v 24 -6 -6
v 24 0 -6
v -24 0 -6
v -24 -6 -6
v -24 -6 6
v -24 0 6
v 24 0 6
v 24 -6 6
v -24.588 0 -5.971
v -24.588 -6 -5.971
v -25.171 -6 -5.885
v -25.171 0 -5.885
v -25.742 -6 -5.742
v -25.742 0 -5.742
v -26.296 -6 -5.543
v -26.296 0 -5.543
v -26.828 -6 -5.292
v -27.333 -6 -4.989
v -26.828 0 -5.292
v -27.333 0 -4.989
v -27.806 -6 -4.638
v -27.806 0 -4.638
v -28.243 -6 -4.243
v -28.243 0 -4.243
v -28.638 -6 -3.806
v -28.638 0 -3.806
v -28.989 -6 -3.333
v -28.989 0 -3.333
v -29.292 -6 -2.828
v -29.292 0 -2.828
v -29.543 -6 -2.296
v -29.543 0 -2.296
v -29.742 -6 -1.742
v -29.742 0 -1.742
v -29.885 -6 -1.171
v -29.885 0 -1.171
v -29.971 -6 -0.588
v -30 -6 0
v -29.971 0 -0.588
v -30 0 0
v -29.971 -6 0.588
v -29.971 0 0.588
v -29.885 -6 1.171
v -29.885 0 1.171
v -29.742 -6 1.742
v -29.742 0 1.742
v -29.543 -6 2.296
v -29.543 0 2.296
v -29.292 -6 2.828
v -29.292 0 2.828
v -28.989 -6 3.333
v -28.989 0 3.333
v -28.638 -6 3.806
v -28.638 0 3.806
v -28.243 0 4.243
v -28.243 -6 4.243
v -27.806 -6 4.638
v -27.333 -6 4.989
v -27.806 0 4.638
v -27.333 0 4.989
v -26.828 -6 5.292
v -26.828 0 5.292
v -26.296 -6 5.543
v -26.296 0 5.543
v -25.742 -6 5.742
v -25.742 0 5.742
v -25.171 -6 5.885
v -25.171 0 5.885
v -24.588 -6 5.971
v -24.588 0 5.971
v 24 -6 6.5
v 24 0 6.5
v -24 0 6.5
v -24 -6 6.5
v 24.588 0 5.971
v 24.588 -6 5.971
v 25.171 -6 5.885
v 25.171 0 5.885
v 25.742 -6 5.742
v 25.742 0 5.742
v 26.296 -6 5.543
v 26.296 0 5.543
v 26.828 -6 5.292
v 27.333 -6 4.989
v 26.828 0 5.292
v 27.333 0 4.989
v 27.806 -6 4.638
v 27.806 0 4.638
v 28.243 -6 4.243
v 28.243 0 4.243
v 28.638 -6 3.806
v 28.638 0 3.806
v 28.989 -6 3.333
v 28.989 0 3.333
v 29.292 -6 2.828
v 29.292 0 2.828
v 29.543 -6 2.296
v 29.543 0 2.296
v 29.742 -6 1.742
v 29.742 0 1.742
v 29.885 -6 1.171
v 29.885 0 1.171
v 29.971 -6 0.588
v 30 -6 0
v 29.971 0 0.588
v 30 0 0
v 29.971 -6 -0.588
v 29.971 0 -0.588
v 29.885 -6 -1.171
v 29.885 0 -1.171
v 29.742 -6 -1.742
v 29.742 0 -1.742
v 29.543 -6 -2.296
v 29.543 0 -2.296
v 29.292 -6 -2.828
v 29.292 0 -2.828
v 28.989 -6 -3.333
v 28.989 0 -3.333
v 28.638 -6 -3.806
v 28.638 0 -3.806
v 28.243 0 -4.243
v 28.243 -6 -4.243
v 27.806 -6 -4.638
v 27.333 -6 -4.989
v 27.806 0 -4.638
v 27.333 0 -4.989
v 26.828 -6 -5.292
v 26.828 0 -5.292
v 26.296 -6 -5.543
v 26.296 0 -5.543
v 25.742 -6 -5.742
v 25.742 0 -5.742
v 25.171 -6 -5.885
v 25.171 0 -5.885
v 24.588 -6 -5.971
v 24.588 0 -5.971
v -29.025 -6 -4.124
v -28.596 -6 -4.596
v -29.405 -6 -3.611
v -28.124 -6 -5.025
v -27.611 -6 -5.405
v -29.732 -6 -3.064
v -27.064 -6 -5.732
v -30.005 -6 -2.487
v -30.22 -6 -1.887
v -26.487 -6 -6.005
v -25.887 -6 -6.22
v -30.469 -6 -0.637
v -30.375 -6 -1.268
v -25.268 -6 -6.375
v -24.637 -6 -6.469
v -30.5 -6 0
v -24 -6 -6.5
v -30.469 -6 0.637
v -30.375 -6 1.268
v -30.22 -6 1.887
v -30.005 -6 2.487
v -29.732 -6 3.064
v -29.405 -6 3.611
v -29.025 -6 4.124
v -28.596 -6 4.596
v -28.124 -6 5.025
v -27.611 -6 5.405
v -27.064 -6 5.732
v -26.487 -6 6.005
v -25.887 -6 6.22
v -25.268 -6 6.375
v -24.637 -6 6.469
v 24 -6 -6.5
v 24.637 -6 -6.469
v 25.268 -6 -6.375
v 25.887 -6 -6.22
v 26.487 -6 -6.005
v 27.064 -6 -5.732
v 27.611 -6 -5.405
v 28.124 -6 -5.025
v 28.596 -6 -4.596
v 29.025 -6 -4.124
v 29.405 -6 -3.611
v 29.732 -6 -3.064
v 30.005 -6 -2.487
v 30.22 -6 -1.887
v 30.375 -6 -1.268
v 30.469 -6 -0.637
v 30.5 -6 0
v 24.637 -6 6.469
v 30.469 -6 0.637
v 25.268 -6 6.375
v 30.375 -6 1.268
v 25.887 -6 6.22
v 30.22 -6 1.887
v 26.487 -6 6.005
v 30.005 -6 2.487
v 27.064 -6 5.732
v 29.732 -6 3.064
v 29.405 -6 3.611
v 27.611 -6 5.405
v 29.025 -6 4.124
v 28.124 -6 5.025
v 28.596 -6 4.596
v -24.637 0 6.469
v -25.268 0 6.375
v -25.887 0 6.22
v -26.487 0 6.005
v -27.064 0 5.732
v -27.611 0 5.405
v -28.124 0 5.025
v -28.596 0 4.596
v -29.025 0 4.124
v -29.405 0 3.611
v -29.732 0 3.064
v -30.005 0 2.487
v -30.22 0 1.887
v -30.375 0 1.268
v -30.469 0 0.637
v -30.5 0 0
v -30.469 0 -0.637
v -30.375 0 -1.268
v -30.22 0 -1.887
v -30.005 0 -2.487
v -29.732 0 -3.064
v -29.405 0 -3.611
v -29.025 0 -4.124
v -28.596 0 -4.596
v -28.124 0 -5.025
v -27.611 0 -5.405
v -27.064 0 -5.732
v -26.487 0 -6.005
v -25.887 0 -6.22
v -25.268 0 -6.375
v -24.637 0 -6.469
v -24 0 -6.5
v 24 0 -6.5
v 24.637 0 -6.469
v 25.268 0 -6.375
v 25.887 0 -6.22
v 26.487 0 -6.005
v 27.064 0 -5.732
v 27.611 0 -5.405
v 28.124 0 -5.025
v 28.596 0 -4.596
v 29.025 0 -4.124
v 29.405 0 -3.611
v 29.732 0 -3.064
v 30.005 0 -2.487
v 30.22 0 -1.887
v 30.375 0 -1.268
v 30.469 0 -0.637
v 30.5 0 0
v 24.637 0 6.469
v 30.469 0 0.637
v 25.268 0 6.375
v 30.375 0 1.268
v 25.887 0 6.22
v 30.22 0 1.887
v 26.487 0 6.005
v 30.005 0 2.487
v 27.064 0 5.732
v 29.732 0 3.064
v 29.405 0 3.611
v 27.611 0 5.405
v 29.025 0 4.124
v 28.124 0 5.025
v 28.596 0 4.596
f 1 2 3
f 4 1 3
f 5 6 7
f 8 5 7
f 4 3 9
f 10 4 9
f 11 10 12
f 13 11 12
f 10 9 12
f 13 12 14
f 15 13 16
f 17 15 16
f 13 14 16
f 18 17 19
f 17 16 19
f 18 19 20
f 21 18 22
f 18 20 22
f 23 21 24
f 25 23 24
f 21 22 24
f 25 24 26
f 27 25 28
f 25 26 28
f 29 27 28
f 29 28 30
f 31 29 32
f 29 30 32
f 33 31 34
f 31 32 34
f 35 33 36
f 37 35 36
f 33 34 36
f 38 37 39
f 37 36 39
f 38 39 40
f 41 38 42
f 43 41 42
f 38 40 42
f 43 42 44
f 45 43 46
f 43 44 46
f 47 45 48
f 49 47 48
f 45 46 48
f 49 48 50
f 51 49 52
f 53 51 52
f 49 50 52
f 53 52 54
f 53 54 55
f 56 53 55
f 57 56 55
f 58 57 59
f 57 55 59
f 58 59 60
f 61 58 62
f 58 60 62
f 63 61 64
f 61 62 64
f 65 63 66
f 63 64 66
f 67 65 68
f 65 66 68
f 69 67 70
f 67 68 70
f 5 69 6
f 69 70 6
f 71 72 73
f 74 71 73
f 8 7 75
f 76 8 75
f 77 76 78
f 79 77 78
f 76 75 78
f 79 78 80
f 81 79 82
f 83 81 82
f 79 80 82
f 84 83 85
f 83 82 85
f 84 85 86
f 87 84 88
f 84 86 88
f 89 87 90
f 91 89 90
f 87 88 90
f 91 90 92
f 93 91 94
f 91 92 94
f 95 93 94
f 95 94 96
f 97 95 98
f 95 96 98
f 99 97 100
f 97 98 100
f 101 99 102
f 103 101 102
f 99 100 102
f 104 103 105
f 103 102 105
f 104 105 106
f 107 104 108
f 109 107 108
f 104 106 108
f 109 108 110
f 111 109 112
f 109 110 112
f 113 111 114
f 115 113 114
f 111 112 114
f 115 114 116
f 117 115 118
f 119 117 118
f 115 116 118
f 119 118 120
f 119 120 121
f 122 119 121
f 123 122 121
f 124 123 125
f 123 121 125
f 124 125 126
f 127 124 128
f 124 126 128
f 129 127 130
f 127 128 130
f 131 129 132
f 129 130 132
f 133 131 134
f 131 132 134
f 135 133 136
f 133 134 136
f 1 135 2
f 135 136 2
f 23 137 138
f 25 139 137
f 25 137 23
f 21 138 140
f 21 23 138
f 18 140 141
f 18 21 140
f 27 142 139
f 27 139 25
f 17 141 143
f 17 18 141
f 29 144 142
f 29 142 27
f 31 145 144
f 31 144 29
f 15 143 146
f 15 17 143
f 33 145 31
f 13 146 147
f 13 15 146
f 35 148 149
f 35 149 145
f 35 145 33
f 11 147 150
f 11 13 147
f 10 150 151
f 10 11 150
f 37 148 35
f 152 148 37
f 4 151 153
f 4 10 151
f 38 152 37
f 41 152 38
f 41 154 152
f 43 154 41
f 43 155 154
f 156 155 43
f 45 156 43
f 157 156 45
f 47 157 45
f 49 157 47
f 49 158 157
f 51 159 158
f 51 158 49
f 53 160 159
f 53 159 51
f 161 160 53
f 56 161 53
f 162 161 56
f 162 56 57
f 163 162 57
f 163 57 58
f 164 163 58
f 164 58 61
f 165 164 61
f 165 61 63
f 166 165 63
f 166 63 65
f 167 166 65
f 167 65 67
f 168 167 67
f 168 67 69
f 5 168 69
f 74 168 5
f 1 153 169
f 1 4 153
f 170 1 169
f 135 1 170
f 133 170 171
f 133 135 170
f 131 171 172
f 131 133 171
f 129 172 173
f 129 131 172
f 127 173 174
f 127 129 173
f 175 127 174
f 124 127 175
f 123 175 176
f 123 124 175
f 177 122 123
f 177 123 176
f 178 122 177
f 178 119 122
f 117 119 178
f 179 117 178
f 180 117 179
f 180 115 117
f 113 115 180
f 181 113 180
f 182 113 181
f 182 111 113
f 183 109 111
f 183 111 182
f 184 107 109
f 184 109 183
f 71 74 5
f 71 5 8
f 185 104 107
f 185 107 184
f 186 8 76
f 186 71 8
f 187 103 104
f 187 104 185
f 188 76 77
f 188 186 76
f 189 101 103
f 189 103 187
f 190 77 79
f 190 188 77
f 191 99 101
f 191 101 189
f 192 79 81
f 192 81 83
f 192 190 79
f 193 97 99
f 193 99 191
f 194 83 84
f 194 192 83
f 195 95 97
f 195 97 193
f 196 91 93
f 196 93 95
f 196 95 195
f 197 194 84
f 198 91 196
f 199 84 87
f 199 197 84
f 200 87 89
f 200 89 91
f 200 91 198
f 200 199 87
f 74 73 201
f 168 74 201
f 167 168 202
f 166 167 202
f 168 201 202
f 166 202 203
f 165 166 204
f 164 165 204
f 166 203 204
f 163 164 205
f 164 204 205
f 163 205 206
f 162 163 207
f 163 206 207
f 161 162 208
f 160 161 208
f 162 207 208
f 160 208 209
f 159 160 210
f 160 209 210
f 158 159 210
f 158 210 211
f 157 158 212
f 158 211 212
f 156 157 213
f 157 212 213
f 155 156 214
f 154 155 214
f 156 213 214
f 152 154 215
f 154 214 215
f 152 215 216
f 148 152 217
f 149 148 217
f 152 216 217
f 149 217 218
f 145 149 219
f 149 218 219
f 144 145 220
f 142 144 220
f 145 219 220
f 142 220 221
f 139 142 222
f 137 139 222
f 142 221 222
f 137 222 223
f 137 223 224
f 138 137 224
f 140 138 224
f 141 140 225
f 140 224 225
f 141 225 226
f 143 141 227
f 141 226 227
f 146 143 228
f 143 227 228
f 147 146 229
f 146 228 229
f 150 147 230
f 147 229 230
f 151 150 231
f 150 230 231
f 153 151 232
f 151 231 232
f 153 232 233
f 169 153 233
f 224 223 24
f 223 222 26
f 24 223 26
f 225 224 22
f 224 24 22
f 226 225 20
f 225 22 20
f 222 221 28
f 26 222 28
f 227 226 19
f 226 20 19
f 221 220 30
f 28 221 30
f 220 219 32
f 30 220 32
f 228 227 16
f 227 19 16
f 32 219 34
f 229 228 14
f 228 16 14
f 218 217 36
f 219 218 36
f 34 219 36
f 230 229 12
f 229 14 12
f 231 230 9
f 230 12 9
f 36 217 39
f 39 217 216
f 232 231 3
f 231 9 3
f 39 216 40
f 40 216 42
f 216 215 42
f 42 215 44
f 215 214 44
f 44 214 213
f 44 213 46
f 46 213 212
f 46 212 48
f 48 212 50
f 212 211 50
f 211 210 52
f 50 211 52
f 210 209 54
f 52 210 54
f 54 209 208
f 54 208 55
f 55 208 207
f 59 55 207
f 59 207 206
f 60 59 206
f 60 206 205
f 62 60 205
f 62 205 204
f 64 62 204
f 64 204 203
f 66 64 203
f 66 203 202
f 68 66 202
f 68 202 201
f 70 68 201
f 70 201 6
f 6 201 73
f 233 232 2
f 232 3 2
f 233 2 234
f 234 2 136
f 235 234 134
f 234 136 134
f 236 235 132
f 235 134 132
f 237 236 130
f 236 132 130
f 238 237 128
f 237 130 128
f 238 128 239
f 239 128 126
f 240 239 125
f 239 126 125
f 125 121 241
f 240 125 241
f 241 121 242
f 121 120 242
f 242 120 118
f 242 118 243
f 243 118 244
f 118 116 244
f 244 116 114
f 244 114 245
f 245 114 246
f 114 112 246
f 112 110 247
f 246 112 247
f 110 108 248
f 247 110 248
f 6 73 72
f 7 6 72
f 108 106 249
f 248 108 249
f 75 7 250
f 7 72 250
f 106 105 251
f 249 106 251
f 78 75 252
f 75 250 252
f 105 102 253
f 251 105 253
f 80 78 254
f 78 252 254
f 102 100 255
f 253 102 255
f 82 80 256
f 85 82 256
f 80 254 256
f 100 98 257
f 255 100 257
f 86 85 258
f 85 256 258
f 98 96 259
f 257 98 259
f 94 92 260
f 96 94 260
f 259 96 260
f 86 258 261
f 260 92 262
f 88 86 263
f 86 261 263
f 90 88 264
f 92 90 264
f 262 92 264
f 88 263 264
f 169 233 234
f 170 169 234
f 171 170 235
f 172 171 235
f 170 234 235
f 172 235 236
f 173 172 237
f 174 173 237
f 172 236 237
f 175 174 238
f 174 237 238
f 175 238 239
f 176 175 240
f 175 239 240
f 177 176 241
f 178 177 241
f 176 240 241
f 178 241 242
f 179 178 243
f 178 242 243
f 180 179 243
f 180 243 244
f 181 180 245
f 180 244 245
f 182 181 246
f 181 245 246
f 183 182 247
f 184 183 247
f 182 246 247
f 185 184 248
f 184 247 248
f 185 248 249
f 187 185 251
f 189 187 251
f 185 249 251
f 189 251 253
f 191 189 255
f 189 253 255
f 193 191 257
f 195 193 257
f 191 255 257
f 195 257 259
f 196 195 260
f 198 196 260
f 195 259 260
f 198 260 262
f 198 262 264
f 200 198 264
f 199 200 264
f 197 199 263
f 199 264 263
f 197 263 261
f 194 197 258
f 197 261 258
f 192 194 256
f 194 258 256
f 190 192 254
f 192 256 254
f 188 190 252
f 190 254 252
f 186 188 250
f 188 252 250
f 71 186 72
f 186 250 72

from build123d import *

# Parameters (mm, degrees)
F1_DEPTH = 6


with BuildPart() as f1:
    # F0 (on Front) → F1 (new body)
    with BuildSketch(Plane.XZ):
        with BuildLine():
            Line((0, 6.5), (-24, 6.5))
            ThreePointArc((-24, 6.5), (-30.5, 0), (-24, -6.5))
            Line((-24, -6.5), (0, -6.5))
            Line((0, -6.5), (24, -6.5))
            ThreePointArc((24, -6.5), (30.5, 0), (24, 6.5))
            Line((24, 6.5), (0, 6.5))
        make_face()
        with BuildLine():
            ThreePointArc((-24, -6), (-30, 0), (-24, 6))
            Line((-24, 6), (0, 6))
            Line((0, 6), (24, 6))
            ThreePointArc((24, 6), (30, 0), (24, -6))
            Line((24, -6), (0, -6))
            Line((0, -6), (-24, -6))
        make_face(mode=Mode.SUBTRACT)
    extrude(amount=F1_DEPTH)


solid = f1.part
